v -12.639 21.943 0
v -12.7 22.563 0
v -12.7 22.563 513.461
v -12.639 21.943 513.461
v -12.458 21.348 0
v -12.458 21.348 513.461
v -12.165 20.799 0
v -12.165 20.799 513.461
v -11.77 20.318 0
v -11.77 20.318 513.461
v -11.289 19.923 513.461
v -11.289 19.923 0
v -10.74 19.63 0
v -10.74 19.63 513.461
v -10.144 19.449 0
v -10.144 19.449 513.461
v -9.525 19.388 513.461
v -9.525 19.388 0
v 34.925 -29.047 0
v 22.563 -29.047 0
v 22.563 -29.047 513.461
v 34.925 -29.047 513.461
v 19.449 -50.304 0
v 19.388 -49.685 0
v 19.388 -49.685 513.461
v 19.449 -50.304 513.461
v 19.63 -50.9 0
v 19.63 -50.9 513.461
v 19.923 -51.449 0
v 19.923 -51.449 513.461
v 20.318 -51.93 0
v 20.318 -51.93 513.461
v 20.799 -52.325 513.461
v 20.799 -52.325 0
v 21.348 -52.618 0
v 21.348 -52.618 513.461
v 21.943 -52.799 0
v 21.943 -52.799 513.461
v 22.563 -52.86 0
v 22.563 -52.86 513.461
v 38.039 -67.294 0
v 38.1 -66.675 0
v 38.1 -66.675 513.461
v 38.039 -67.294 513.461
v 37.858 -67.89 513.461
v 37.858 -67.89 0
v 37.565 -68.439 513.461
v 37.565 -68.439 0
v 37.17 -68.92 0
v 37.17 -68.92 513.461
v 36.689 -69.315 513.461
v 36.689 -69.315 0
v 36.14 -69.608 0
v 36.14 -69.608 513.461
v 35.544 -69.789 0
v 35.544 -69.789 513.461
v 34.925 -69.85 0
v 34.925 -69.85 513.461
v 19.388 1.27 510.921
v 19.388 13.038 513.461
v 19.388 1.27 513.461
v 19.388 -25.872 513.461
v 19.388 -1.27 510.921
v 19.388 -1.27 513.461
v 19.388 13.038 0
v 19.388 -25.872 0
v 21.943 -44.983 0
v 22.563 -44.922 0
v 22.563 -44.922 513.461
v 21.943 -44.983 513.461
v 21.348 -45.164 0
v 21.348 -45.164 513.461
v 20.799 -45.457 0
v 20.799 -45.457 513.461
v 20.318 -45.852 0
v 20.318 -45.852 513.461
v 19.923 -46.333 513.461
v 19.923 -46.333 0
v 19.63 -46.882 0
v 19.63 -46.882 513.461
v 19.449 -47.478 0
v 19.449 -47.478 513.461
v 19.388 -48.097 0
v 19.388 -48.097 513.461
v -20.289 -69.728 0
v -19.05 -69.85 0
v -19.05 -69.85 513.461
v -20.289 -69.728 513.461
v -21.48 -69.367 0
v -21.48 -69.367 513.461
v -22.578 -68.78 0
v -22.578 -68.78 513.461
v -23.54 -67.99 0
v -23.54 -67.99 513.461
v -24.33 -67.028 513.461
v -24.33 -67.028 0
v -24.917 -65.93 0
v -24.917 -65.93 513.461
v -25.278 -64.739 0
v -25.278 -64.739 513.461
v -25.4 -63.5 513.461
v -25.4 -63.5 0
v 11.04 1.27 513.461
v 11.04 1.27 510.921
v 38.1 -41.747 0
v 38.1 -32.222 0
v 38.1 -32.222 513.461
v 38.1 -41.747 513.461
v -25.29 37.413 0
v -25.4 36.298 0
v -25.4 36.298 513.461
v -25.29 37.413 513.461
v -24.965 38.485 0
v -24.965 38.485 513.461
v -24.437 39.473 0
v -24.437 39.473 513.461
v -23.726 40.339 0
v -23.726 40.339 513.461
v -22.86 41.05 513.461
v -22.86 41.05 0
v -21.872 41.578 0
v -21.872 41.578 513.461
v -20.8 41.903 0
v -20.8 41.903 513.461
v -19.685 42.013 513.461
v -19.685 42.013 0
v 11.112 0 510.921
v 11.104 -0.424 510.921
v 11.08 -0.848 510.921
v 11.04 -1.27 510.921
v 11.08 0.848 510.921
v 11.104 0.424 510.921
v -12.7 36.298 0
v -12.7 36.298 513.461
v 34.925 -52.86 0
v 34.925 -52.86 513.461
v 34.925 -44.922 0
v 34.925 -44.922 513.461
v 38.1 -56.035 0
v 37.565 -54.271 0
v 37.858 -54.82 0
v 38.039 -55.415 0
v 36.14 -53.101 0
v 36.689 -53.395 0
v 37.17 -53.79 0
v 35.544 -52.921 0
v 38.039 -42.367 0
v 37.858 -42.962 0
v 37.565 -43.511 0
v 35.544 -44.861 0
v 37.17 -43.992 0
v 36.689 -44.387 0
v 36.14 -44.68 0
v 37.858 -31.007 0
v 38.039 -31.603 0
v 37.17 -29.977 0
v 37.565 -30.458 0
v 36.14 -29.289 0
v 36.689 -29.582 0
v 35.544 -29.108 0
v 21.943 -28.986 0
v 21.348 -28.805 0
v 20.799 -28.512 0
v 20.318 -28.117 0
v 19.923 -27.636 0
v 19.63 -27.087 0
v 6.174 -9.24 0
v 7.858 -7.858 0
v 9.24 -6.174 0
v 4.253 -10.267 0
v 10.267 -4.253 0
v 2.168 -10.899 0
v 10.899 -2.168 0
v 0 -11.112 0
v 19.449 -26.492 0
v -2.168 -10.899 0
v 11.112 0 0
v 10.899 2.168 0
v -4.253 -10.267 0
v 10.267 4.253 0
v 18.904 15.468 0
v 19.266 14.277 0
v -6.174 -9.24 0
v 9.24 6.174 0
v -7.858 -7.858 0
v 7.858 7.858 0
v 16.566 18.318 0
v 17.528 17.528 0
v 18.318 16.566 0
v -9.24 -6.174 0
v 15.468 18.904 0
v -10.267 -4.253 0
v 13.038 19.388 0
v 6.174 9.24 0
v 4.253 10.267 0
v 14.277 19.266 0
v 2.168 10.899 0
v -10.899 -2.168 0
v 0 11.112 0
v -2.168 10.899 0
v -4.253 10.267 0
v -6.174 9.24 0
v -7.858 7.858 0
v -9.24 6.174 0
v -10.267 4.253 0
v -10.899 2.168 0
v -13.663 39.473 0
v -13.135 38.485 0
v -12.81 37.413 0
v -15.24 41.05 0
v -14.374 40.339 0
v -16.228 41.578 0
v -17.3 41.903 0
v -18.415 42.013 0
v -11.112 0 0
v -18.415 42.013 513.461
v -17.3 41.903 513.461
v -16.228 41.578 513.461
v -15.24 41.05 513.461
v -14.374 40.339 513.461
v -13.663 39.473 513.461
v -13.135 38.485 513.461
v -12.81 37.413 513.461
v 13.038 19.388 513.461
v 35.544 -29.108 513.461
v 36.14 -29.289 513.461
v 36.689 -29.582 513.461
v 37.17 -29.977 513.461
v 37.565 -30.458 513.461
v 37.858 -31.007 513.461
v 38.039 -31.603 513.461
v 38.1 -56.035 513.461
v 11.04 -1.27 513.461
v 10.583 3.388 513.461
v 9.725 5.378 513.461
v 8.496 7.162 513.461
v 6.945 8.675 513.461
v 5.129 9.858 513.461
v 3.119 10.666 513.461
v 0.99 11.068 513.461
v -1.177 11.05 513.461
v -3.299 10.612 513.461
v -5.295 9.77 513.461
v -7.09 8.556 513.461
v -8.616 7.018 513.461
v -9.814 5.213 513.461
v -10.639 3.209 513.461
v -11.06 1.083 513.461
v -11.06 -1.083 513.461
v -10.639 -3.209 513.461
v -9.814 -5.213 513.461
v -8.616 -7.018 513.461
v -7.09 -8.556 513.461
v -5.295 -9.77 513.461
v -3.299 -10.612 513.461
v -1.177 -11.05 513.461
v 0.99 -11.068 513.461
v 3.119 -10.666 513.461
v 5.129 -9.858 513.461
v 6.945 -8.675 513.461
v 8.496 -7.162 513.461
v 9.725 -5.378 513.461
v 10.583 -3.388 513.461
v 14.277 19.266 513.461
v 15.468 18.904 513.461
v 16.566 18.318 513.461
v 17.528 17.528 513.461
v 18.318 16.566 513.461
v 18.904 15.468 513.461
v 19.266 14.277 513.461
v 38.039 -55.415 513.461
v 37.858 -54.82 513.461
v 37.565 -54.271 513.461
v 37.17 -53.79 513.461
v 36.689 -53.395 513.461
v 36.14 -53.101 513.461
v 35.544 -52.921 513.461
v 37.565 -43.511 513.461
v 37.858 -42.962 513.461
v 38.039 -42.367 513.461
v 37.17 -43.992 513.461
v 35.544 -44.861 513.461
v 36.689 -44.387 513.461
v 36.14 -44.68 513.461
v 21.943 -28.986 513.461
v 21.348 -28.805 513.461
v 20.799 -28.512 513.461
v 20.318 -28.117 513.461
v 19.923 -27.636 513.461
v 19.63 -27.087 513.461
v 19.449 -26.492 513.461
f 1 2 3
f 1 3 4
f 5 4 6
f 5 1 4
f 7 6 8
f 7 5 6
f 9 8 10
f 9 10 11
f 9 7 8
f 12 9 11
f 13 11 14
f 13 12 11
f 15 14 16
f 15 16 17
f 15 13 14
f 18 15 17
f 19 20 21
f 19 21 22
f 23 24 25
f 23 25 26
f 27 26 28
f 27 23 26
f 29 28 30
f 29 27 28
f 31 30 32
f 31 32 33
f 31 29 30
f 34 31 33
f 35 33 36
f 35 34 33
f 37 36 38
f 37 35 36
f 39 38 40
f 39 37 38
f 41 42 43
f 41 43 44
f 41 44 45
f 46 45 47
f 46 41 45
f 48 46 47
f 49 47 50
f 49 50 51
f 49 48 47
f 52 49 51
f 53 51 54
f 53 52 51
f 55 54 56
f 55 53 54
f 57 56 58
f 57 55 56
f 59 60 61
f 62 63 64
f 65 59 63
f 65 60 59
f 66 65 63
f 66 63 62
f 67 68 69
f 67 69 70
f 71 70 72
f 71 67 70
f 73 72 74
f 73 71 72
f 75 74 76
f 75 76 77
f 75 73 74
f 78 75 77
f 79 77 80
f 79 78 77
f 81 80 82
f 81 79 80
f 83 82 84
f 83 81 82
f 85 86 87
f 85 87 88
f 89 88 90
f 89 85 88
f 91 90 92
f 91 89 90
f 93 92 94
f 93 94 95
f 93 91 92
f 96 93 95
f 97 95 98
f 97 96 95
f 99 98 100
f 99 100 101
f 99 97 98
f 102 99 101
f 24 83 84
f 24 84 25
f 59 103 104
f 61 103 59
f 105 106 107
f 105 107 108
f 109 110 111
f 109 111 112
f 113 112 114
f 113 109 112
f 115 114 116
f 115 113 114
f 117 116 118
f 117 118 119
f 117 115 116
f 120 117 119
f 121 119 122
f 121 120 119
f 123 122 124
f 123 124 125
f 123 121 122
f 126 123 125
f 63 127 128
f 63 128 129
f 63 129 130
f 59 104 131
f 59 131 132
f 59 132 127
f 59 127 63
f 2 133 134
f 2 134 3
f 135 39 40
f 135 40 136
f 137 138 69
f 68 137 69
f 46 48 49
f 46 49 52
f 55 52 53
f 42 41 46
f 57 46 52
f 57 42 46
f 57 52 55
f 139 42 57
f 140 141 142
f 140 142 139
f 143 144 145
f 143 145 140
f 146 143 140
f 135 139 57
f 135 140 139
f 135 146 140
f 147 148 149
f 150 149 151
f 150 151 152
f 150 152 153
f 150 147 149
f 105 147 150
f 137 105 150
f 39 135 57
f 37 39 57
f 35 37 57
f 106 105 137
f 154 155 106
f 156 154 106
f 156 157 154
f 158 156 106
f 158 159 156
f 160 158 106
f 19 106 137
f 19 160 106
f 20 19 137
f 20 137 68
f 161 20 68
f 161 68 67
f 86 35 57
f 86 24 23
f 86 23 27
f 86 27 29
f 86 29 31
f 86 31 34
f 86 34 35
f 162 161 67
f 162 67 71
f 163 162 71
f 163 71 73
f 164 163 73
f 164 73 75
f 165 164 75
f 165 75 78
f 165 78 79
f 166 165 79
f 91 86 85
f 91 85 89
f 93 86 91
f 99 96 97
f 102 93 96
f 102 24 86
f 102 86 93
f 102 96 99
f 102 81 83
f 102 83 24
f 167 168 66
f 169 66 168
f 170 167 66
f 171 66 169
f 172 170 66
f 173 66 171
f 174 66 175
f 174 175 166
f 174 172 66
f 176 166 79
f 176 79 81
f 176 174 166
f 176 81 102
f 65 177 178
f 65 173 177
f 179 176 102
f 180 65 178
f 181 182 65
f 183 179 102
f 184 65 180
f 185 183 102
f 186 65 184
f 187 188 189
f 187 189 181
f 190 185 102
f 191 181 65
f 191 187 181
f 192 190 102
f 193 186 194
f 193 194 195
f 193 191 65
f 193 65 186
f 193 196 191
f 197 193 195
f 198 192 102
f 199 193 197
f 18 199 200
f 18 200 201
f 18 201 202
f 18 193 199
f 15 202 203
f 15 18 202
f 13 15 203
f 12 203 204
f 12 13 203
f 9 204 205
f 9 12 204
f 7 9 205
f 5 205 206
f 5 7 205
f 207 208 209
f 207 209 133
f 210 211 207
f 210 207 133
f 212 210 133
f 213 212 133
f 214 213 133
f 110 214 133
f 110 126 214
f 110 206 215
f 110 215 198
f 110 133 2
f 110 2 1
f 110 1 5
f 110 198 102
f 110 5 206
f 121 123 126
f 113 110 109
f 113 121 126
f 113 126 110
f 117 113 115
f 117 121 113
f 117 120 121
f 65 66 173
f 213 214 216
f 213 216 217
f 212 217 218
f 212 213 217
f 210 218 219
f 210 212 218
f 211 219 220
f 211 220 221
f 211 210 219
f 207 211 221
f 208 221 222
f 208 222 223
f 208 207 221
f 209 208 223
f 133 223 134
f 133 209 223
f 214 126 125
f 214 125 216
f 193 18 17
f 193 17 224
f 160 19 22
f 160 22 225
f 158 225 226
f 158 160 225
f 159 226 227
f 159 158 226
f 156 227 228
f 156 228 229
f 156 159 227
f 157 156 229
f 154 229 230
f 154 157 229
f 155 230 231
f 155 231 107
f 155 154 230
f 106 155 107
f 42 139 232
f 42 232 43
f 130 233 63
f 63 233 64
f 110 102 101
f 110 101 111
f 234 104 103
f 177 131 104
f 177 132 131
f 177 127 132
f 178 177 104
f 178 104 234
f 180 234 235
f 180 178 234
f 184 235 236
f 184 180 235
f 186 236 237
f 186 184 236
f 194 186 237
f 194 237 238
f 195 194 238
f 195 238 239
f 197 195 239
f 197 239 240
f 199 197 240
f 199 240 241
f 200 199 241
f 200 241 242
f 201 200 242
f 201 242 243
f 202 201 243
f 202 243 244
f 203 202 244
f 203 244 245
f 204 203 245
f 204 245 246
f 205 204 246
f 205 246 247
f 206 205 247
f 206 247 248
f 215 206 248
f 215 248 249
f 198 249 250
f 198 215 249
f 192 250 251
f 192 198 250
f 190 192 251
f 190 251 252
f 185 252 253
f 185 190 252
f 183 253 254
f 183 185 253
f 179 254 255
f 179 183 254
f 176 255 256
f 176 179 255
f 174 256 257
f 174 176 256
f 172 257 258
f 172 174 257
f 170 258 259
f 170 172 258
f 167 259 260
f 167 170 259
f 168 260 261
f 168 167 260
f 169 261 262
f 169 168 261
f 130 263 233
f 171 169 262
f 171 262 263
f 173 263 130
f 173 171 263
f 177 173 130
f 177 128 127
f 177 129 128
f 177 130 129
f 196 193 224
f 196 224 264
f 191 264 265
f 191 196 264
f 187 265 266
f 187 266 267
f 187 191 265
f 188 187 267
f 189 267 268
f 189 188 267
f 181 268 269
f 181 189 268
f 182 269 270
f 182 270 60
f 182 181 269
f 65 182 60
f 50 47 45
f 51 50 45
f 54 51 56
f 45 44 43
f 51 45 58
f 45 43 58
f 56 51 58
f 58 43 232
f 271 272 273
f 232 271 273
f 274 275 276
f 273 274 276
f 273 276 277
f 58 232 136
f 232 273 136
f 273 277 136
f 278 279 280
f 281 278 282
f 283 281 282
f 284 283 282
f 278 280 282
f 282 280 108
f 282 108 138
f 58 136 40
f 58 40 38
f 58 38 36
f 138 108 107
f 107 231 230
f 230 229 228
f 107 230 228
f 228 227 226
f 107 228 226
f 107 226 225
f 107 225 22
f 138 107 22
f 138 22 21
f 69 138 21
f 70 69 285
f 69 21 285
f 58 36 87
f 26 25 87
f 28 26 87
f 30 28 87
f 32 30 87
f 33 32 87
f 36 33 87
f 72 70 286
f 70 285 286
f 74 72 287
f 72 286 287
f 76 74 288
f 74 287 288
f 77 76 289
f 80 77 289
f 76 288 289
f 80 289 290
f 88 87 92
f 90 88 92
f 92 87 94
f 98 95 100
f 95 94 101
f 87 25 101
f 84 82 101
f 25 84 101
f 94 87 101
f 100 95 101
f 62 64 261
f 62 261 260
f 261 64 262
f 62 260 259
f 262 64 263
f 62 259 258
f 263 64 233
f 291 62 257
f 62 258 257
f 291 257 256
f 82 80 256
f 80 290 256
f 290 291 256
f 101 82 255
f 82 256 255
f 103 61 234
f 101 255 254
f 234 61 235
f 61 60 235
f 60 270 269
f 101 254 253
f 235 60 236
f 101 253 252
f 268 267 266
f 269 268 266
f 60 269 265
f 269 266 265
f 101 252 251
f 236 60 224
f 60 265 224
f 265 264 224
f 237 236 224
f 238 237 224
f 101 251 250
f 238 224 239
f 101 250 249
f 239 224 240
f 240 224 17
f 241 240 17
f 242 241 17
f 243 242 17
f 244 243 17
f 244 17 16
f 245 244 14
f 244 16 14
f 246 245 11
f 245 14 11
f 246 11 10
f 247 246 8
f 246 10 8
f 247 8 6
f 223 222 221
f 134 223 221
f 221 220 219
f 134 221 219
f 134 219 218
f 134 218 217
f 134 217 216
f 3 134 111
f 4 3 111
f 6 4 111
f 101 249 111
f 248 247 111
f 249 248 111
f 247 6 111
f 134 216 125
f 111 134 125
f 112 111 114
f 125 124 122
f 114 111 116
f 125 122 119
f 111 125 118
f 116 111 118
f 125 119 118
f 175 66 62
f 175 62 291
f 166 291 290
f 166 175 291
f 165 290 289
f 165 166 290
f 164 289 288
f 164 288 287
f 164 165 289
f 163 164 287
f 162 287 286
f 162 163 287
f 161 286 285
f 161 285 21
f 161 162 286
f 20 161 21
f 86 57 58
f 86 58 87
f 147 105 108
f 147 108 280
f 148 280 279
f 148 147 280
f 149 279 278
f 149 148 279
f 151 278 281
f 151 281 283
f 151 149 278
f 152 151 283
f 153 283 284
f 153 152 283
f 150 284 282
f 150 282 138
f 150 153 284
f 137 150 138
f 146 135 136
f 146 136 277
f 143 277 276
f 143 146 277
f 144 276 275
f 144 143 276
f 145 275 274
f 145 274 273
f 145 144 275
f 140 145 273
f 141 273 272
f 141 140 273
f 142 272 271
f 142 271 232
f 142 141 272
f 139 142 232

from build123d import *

# Parameters (mm, degrees)
SKETCH1_R           = 11.1125
BOSS_EXTRUDE1_DEPTH = 513.461
SKETCH2_W           = 20.65782
SKETCH2_H           = 2.54
CUT_EXTRUDE1_DEPTH  = 2.54


with BuildPart() as part:
    # Sketch1 → Boss-Extrude1 (new body)
    with BuildSketch(Plane.XY):
        with BuildLine():
            Line((34.925, -69.85), (-19.05, -69.85))
            ThreePointArc((-19.05, -69.85), (-23.540128061, -67.990128061), (-25.4, -63.5))
            Line((-25.4, -63.5), (-25.4, 36.297819962))
            ThreePointArc((-25.4, 36.297819962), (-23.726115254, 40.338935216), (-19.685, 42.012819962))
            Line((-19.685, 42.012819962), (-18.415, 42.012819962))
            ThreePointArc((-18.415, 42.012819962), (-14.373884746, 40.338935216), (-12.7, 36.297819962))
            Line((-12.7, 36.297819962), (-12.7, 22.56282))
            ThreePointArc((-12.7, 22.56282), (-11.77006403, 20.31775597), (-9.525, 19.38782))
            Line((-9.525, 19.38782), (13.03782, 19.38782))
            ThreePointArc((13.03782, 19.38782), (17.527948061, 17.527948061), (19.38782, 13.03782))
            Line((19.38782, 13.03782), (19.38782, -25.872179904))
            ThreePointArc((19.38782, -25.872179904), (20.31775597, -28.117243934), (22.56282, -29.047179904))
            Line((22.56282, -29.047179904), (34.925, -29.047179904))
            ThreePointArc((34.925, -29.047179904), (37.17006403, -29.977115874), (38.1, -32.222179904))
            Line((38.1, -32.222179904), (38.1, -41.747179904))
            ThreePointArc((38.1, -41.747179904), (37.17006403, -43.992243934), (34.925, -44.922179904))
            Line((34.925, -44.922179904), (22.56282, -44.922179904))
            ThreePointArc((22.56282, -44.922179904), (20.31775597, -45.852115874), (19.38782, -48.097179904))
            Line((19.38782, -48.097179904), (19.38782, -49.684679904))
            ThreePointArc((19.38782, -49.684679904), (20.31775597, -51.929743934), (22.56282, -52.859679904))
            Line((22.56282, -52.859679904), (34.925, -52.859679904))
            ThreePointArc((34.925, -52.859679904), (37.17006403, -53.789615874), (38.1, -56.034679904))
            Line((38.1, -56.034679904), (38.1, -66.675))
            ThreePointArc((38.1, -66.675), (37.17006403, -68.92006403), (34.925, -69.85))
        make_face()
        Circle(SKETCH1_R, mode=Mode.SUBTRACT)
    extrude(amount=BOSS_EXTRUDE1_DEPTH)

    # Sketch2 → Cut-Extrude1 (cut)
    with BuildSketch(Plane.XY.offset(513.461)):
        with Locations((9.05891, 0)):
            Rectangle(SKETCH2_W, SKETCH2_H)
    extrude(amount=-CUT_EXTRUDE1_DEPTH, mode=Mode.SUBTRACT)


solid = part.part
